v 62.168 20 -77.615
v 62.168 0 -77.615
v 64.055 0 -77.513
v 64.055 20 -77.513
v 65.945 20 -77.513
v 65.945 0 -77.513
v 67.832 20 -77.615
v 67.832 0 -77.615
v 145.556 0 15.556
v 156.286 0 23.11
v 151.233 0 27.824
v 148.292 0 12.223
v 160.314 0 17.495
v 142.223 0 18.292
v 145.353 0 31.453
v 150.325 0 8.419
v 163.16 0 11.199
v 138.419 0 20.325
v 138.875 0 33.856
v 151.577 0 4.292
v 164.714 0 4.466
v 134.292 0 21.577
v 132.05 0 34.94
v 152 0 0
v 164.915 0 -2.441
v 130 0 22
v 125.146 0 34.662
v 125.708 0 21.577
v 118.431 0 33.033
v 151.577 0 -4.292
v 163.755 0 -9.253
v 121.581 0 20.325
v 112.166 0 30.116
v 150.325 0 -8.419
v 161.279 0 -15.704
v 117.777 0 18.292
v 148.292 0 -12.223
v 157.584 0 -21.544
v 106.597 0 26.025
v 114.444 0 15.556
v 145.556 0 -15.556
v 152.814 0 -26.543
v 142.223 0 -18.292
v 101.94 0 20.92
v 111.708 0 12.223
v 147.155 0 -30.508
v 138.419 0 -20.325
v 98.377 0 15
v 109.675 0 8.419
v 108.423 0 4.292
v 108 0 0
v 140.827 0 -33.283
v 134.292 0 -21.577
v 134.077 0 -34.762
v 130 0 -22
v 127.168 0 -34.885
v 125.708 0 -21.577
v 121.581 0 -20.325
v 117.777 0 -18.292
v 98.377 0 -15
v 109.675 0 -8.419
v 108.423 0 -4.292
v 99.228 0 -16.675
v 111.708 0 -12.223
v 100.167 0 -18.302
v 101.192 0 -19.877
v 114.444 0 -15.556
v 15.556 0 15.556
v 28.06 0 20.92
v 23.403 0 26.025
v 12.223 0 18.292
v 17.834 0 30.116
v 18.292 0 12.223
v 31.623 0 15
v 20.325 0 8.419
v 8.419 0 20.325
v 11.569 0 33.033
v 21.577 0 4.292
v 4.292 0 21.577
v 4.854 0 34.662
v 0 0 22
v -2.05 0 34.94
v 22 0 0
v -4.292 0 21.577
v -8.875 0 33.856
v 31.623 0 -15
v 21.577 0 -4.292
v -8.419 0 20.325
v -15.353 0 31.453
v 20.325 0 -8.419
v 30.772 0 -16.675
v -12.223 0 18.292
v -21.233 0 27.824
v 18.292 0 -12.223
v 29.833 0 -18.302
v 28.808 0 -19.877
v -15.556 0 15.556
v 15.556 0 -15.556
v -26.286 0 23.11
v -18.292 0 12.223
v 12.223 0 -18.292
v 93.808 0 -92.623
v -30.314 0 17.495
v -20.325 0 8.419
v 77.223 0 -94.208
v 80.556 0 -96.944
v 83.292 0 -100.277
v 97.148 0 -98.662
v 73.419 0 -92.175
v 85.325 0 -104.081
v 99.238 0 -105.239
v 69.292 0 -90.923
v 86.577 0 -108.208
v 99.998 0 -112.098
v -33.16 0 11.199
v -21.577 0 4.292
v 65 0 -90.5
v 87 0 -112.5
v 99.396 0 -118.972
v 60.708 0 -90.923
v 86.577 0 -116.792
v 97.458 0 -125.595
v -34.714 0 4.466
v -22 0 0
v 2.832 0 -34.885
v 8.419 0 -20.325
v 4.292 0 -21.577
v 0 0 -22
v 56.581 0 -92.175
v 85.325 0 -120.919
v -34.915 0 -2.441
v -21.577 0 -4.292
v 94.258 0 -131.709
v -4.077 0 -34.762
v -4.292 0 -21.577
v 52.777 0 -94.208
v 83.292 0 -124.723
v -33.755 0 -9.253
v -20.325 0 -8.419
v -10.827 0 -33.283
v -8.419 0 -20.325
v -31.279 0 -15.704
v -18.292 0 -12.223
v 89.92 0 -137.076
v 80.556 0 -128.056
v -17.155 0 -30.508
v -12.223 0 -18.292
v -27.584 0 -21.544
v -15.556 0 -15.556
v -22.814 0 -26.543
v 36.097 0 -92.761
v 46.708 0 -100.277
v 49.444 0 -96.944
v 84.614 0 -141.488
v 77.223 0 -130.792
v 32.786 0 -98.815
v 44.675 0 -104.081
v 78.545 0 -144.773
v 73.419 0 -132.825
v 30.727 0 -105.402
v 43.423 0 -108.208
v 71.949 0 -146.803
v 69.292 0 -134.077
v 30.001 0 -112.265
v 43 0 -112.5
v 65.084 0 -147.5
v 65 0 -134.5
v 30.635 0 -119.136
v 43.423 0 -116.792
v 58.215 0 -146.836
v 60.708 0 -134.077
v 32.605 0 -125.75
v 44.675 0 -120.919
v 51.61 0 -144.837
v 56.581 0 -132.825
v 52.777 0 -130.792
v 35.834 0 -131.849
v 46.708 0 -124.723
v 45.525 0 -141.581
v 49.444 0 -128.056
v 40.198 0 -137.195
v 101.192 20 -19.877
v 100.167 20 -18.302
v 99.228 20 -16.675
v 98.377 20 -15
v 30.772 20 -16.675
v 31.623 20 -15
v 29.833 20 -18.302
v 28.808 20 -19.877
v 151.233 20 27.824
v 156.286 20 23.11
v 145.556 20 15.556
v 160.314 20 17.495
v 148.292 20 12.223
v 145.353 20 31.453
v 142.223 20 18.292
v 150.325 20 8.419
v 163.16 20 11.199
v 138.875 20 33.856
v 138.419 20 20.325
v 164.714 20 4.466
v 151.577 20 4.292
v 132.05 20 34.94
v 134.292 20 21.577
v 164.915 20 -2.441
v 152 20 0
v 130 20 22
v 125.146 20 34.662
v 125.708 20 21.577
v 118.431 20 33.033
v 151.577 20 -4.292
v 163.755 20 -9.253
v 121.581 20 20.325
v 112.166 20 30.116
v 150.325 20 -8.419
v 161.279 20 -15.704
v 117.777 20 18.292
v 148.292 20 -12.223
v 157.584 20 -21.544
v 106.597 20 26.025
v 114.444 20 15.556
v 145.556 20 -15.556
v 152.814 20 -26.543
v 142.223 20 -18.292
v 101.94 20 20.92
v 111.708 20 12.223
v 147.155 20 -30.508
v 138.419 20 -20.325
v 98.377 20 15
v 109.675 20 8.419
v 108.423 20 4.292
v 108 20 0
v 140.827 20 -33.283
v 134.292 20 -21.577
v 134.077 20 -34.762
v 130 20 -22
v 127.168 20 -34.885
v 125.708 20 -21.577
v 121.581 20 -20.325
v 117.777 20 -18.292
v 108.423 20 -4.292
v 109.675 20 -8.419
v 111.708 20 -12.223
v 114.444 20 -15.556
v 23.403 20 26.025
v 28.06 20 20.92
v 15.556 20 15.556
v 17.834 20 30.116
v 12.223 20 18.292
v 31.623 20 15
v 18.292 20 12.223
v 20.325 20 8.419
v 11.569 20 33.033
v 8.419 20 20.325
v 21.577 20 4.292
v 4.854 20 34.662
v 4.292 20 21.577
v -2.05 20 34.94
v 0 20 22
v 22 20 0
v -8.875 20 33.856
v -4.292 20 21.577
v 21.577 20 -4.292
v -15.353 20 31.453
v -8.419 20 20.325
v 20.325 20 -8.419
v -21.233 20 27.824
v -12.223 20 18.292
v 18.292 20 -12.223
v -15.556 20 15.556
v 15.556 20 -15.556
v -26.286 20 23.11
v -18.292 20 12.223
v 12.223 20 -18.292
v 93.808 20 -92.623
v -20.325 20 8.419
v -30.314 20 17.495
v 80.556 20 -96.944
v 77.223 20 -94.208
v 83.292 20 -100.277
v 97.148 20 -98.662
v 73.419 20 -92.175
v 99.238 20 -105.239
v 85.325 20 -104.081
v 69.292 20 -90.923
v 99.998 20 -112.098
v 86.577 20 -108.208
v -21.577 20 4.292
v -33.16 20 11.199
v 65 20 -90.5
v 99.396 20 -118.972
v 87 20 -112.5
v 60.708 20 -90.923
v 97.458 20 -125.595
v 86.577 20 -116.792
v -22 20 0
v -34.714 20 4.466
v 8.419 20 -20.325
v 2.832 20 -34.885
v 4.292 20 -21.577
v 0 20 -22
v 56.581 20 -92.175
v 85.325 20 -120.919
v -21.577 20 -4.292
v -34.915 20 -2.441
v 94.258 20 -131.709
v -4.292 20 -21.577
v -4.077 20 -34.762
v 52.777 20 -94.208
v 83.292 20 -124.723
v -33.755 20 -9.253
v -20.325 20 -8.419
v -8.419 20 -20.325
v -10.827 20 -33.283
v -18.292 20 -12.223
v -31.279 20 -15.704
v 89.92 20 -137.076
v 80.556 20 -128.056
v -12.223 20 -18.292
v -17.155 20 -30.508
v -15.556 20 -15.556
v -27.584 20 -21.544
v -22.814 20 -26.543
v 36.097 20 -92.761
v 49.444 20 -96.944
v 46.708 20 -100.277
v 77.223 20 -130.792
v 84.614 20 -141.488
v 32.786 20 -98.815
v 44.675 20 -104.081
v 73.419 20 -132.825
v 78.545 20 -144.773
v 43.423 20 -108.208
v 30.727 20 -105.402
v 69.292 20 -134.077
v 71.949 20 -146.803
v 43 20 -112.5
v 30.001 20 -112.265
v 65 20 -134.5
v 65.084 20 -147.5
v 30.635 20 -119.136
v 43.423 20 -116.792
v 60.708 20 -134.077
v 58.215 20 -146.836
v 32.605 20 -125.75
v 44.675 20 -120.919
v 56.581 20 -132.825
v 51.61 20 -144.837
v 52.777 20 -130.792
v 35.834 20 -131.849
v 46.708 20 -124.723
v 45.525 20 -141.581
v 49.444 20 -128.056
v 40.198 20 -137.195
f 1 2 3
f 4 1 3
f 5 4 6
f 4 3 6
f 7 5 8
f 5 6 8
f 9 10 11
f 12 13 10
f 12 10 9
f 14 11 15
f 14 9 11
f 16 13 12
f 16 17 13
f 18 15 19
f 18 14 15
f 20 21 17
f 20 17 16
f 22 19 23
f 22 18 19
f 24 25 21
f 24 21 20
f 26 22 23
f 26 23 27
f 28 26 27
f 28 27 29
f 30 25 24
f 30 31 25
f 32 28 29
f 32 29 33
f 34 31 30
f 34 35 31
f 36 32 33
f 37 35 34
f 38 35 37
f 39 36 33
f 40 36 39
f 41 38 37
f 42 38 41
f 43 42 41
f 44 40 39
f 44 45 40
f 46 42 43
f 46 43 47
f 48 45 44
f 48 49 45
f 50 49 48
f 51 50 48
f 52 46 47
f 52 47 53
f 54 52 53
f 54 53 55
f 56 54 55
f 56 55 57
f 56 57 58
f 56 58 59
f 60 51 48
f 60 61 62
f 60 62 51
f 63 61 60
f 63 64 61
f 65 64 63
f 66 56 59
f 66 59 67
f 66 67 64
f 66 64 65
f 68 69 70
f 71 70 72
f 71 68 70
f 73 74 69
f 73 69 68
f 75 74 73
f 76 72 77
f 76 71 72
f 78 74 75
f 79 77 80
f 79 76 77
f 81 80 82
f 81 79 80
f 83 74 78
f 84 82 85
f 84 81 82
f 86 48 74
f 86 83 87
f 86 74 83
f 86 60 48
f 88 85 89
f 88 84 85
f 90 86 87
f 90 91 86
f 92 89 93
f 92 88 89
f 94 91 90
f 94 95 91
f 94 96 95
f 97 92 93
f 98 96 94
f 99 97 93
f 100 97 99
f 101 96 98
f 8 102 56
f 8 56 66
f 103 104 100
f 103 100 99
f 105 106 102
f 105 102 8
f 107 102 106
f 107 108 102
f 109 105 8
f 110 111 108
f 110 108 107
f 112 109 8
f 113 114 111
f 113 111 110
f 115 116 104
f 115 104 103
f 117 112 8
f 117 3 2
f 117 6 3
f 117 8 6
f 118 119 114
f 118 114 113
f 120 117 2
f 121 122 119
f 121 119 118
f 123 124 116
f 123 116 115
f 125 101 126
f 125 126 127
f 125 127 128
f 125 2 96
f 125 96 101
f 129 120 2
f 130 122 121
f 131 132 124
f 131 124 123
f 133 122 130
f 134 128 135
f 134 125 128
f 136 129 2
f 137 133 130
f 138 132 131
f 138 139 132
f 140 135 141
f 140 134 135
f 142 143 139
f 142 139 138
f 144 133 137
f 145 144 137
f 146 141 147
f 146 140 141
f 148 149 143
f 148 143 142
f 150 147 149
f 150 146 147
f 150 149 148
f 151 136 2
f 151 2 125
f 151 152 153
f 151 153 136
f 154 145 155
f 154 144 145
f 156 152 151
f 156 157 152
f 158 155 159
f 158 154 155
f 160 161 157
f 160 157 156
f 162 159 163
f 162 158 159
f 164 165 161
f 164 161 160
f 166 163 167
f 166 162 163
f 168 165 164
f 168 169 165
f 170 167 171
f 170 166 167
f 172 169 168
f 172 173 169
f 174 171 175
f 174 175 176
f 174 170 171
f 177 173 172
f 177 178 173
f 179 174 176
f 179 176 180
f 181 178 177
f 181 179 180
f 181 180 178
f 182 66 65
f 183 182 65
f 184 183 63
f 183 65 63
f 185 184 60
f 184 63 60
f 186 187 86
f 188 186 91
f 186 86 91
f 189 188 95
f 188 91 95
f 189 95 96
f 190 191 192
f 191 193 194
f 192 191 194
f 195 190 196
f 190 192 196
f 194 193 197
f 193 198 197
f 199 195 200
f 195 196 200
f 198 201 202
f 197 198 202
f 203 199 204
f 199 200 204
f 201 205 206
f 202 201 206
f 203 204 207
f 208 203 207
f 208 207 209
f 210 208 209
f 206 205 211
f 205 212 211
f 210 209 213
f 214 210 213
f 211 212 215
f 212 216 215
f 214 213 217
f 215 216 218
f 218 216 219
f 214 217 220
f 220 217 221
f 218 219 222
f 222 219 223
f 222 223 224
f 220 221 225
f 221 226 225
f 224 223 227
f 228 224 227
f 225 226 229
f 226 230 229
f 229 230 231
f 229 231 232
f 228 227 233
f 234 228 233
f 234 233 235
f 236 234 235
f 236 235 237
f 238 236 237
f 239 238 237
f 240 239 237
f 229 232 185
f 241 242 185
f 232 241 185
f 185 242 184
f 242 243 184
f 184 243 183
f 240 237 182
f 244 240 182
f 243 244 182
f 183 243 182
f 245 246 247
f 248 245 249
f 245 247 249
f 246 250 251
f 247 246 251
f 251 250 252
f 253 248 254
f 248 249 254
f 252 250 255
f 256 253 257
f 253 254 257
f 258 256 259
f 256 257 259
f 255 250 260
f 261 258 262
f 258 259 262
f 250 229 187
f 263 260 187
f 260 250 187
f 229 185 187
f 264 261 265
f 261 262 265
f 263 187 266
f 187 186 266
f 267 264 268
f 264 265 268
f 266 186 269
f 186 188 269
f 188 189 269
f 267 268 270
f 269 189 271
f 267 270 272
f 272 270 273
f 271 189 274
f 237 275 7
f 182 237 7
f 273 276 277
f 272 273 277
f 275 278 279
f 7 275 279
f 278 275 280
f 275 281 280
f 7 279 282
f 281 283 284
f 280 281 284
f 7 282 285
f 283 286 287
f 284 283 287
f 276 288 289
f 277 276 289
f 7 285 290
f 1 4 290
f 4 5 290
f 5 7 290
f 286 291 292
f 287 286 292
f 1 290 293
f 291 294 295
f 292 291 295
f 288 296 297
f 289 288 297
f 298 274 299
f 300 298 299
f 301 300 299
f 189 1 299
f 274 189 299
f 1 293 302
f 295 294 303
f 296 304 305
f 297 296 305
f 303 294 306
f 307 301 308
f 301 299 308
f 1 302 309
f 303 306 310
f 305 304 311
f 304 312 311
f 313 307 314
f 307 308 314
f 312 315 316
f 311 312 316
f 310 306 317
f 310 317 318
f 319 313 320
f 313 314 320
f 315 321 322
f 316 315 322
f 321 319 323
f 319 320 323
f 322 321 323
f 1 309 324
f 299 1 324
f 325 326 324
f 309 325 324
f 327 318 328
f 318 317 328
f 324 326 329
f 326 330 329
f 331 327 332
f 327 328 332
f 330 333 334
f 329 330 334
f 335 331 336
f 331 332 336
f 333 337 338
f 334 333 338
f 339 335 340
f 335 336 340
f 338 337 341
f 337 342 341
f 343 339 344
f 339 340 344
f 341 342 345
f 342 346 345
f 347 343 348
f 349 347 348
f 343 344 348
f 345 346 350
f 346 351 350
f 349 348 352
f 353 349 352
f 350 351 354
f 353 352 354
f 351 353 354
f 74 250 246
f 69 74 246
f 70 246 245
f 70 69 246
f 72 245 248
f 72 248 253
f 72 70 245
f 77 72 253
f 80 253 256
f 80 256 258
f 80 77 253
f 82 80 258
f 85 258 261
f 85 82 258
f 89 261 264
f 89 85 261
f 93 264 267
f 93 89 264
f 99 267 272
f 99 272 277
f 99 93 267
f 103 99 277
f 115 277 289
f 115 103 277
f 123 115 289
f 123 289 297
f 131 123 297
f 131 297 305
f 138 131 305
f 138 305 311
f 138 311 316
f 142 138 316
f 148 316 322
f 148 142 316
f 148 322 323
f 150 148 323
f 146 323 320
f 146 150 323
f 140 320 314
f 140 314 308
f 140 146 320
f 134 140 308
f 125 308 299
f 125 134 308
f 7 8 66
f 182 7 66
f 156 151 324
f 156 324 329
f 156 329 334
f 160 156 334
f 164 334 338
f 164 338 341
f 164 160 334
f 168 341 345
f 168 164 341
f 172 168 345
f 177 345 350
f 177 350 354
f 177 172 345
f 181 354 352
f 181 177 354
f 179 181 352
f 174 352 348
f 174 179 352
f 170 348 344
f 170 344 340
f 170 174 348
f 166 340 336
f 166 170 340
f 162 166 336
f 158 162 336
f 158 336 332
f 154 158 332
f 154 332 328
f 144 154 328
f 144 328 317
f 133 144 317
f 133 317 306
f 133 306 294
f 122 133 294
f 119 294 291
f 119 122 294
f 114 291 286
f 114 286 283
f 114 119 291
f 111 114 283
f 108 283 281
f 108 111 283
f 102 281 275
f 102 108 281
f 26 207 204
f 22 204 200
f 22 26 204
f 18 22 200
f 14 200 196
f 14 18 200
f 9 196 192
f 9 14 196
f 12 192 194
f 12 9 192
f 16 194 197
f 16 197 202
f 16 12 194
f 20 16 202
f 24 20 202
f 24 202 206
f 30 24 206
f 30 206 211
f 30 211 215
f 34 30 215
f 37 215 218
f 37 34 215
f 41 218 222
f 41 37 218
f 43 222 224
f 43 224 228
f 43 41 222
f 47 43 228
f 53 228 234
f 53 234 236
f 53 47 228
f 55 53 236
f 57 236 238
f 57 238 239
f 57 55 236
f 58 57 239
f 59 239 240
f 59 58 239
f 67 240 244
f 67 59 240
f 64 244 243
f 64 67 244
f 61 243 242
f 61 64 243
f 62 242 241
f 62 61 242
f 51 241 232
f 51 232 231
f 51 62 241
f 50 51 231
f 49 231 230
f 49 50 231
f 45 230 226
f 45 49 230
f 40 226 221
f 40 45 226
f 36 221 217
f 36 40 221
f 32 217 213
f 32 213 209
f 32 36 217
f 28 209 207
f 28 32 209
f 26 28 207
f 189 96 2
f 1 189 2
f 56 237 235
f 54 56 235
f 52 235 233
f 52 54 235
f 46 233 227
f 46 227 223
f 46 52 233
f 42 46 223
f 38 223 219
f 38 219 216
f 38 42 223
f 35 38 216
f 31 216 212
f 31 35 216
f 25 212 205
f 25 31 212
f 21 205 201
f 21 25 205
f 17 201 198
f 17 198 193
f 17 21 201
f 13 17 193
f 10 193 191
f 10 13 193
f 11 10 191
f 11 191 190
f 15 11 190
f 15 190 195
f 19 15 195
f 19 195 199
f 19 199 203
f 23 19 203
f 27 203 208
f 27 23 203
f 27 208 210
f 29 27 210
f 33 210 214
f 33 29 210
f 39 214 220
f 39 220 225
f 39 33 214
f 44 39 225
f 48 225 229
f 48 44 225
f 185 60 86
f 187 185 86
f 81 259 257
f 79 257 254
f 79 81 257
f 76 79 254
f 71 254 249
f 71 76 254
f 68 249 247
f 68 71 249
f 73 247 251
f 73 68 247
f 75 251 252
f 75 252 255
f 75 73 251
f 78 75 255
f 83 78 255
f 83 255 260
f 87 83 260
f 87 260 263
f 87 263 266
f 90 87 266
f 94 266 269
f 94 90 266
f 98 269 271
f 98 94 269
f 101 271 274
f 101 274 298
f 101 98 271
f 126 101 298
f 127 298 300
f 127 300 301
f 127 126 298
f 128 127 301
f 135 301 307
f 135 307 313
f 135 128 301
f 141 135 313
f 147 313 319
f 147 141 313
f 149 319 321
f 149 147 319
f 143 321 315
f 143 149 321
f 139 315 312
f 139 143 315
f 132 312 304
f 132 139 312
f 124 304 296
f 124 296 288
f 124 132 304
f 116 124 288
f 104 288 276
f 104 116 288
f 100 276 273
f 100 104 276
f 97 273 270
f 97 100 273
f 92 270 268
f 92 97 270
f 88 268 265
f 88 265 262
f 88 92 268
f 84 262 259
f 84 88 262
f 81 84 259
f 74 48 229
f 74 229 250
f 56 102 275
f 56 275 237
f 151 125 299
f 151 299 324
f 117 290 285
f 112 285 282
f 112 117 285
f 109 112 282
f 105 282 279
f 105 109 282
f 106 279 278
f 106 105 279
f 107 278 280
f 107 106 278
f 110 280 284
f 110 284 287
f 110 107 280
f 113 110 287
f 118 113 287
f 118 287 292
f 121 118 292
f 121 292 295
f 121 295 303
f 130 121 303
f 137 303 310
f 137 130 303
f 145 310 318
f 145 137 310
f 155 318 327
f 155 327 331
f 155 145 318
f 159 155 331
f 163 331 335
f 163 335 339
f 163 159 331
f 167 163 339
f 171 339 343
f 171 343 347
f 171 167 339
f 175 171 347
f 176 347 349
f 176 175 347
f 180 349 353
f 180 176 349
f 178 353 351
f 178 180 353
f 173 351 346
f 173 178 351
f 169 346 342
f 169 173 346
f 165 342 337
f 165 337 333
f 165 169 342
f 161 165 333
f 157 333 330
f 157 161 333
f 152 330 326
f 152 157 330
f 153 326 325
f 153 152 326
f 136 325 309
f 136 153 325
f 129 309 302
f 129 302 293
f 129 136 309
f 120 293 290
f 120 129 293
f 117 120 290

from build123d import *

# Parameters (mm, degrees)
SKETCH1_R           = 22
BOSS_EXTRUDE1_DEPTH = 20


with BuildPart() as part:
    # Sketch1 → Boss-Extrude1 (new body)
    with BuildSketch(Plane(origin=(0, 0, 0), x_dir=(1, 0, 0), z_dir=(0, 1, 0))):
        with BuildLine():
            Line((98.377223398, -15), (31.622776602, -15))
            ThreePointArc((31.622776602, -15), (-30.313693749, -17.495141363), (2.832190618, 34.885221747))
            Line((2.832190618, 34.885221747), (36.097300033, 92.760852739))
            ThreePointArc((36.097300033, 92.760852739), (65.083539163, 147.499900303), (93.808142815, 92.62310619))
            Line((93.808142815, 92.62310619), (127.167809382, 34.885221747))
            ThreePointArc((127.167809382, 34.885221747), (160.313693749, -17.495141363), (98.377223398, -15))
        make_face()
        with Locations(Location((0, 0, 0), (0, 0, 270))):
            Circle(SKETCH1_R, mode=Mode.SUBTRACT)
        with Locations(Location((65, 112.5, 0), (0, 0, 270))):
            Circle(SKETCH1_R, mode=Mode.SUBTRACT)
        with Locations(Location((130, 0, 0), (0, 0, 270))):
            Circle(SKETCH1_R, mode=Mode.SUBTRACT)
        with BuildLine():
            Line((98.377223398, 15), (31.622776602, 15))
            ThreePointArc((31.622776602, 15), (30.313693749, 17.495141363), (28.808142815, 19.87689381))
            Line((28.808142815, 19.87689381), (62.167809382, 77.614778253))
            ThreePointArc((62.167809382, 77.614778253), (65, 77.5), (67.832190618, 77.614778253))
            Line((67.832190618, 77.614778253), (101.191857185, 19.87689381))
            ThreePointArc((101.191857185, 19.87689381), (99.686306251, 17.495141363), (98.377223398, 15))
        make_face(mode=Mode.SUBTRACT)
    extrude(amount=BOSS_EXTRUDE1_DEPTH)


solid = part.part
